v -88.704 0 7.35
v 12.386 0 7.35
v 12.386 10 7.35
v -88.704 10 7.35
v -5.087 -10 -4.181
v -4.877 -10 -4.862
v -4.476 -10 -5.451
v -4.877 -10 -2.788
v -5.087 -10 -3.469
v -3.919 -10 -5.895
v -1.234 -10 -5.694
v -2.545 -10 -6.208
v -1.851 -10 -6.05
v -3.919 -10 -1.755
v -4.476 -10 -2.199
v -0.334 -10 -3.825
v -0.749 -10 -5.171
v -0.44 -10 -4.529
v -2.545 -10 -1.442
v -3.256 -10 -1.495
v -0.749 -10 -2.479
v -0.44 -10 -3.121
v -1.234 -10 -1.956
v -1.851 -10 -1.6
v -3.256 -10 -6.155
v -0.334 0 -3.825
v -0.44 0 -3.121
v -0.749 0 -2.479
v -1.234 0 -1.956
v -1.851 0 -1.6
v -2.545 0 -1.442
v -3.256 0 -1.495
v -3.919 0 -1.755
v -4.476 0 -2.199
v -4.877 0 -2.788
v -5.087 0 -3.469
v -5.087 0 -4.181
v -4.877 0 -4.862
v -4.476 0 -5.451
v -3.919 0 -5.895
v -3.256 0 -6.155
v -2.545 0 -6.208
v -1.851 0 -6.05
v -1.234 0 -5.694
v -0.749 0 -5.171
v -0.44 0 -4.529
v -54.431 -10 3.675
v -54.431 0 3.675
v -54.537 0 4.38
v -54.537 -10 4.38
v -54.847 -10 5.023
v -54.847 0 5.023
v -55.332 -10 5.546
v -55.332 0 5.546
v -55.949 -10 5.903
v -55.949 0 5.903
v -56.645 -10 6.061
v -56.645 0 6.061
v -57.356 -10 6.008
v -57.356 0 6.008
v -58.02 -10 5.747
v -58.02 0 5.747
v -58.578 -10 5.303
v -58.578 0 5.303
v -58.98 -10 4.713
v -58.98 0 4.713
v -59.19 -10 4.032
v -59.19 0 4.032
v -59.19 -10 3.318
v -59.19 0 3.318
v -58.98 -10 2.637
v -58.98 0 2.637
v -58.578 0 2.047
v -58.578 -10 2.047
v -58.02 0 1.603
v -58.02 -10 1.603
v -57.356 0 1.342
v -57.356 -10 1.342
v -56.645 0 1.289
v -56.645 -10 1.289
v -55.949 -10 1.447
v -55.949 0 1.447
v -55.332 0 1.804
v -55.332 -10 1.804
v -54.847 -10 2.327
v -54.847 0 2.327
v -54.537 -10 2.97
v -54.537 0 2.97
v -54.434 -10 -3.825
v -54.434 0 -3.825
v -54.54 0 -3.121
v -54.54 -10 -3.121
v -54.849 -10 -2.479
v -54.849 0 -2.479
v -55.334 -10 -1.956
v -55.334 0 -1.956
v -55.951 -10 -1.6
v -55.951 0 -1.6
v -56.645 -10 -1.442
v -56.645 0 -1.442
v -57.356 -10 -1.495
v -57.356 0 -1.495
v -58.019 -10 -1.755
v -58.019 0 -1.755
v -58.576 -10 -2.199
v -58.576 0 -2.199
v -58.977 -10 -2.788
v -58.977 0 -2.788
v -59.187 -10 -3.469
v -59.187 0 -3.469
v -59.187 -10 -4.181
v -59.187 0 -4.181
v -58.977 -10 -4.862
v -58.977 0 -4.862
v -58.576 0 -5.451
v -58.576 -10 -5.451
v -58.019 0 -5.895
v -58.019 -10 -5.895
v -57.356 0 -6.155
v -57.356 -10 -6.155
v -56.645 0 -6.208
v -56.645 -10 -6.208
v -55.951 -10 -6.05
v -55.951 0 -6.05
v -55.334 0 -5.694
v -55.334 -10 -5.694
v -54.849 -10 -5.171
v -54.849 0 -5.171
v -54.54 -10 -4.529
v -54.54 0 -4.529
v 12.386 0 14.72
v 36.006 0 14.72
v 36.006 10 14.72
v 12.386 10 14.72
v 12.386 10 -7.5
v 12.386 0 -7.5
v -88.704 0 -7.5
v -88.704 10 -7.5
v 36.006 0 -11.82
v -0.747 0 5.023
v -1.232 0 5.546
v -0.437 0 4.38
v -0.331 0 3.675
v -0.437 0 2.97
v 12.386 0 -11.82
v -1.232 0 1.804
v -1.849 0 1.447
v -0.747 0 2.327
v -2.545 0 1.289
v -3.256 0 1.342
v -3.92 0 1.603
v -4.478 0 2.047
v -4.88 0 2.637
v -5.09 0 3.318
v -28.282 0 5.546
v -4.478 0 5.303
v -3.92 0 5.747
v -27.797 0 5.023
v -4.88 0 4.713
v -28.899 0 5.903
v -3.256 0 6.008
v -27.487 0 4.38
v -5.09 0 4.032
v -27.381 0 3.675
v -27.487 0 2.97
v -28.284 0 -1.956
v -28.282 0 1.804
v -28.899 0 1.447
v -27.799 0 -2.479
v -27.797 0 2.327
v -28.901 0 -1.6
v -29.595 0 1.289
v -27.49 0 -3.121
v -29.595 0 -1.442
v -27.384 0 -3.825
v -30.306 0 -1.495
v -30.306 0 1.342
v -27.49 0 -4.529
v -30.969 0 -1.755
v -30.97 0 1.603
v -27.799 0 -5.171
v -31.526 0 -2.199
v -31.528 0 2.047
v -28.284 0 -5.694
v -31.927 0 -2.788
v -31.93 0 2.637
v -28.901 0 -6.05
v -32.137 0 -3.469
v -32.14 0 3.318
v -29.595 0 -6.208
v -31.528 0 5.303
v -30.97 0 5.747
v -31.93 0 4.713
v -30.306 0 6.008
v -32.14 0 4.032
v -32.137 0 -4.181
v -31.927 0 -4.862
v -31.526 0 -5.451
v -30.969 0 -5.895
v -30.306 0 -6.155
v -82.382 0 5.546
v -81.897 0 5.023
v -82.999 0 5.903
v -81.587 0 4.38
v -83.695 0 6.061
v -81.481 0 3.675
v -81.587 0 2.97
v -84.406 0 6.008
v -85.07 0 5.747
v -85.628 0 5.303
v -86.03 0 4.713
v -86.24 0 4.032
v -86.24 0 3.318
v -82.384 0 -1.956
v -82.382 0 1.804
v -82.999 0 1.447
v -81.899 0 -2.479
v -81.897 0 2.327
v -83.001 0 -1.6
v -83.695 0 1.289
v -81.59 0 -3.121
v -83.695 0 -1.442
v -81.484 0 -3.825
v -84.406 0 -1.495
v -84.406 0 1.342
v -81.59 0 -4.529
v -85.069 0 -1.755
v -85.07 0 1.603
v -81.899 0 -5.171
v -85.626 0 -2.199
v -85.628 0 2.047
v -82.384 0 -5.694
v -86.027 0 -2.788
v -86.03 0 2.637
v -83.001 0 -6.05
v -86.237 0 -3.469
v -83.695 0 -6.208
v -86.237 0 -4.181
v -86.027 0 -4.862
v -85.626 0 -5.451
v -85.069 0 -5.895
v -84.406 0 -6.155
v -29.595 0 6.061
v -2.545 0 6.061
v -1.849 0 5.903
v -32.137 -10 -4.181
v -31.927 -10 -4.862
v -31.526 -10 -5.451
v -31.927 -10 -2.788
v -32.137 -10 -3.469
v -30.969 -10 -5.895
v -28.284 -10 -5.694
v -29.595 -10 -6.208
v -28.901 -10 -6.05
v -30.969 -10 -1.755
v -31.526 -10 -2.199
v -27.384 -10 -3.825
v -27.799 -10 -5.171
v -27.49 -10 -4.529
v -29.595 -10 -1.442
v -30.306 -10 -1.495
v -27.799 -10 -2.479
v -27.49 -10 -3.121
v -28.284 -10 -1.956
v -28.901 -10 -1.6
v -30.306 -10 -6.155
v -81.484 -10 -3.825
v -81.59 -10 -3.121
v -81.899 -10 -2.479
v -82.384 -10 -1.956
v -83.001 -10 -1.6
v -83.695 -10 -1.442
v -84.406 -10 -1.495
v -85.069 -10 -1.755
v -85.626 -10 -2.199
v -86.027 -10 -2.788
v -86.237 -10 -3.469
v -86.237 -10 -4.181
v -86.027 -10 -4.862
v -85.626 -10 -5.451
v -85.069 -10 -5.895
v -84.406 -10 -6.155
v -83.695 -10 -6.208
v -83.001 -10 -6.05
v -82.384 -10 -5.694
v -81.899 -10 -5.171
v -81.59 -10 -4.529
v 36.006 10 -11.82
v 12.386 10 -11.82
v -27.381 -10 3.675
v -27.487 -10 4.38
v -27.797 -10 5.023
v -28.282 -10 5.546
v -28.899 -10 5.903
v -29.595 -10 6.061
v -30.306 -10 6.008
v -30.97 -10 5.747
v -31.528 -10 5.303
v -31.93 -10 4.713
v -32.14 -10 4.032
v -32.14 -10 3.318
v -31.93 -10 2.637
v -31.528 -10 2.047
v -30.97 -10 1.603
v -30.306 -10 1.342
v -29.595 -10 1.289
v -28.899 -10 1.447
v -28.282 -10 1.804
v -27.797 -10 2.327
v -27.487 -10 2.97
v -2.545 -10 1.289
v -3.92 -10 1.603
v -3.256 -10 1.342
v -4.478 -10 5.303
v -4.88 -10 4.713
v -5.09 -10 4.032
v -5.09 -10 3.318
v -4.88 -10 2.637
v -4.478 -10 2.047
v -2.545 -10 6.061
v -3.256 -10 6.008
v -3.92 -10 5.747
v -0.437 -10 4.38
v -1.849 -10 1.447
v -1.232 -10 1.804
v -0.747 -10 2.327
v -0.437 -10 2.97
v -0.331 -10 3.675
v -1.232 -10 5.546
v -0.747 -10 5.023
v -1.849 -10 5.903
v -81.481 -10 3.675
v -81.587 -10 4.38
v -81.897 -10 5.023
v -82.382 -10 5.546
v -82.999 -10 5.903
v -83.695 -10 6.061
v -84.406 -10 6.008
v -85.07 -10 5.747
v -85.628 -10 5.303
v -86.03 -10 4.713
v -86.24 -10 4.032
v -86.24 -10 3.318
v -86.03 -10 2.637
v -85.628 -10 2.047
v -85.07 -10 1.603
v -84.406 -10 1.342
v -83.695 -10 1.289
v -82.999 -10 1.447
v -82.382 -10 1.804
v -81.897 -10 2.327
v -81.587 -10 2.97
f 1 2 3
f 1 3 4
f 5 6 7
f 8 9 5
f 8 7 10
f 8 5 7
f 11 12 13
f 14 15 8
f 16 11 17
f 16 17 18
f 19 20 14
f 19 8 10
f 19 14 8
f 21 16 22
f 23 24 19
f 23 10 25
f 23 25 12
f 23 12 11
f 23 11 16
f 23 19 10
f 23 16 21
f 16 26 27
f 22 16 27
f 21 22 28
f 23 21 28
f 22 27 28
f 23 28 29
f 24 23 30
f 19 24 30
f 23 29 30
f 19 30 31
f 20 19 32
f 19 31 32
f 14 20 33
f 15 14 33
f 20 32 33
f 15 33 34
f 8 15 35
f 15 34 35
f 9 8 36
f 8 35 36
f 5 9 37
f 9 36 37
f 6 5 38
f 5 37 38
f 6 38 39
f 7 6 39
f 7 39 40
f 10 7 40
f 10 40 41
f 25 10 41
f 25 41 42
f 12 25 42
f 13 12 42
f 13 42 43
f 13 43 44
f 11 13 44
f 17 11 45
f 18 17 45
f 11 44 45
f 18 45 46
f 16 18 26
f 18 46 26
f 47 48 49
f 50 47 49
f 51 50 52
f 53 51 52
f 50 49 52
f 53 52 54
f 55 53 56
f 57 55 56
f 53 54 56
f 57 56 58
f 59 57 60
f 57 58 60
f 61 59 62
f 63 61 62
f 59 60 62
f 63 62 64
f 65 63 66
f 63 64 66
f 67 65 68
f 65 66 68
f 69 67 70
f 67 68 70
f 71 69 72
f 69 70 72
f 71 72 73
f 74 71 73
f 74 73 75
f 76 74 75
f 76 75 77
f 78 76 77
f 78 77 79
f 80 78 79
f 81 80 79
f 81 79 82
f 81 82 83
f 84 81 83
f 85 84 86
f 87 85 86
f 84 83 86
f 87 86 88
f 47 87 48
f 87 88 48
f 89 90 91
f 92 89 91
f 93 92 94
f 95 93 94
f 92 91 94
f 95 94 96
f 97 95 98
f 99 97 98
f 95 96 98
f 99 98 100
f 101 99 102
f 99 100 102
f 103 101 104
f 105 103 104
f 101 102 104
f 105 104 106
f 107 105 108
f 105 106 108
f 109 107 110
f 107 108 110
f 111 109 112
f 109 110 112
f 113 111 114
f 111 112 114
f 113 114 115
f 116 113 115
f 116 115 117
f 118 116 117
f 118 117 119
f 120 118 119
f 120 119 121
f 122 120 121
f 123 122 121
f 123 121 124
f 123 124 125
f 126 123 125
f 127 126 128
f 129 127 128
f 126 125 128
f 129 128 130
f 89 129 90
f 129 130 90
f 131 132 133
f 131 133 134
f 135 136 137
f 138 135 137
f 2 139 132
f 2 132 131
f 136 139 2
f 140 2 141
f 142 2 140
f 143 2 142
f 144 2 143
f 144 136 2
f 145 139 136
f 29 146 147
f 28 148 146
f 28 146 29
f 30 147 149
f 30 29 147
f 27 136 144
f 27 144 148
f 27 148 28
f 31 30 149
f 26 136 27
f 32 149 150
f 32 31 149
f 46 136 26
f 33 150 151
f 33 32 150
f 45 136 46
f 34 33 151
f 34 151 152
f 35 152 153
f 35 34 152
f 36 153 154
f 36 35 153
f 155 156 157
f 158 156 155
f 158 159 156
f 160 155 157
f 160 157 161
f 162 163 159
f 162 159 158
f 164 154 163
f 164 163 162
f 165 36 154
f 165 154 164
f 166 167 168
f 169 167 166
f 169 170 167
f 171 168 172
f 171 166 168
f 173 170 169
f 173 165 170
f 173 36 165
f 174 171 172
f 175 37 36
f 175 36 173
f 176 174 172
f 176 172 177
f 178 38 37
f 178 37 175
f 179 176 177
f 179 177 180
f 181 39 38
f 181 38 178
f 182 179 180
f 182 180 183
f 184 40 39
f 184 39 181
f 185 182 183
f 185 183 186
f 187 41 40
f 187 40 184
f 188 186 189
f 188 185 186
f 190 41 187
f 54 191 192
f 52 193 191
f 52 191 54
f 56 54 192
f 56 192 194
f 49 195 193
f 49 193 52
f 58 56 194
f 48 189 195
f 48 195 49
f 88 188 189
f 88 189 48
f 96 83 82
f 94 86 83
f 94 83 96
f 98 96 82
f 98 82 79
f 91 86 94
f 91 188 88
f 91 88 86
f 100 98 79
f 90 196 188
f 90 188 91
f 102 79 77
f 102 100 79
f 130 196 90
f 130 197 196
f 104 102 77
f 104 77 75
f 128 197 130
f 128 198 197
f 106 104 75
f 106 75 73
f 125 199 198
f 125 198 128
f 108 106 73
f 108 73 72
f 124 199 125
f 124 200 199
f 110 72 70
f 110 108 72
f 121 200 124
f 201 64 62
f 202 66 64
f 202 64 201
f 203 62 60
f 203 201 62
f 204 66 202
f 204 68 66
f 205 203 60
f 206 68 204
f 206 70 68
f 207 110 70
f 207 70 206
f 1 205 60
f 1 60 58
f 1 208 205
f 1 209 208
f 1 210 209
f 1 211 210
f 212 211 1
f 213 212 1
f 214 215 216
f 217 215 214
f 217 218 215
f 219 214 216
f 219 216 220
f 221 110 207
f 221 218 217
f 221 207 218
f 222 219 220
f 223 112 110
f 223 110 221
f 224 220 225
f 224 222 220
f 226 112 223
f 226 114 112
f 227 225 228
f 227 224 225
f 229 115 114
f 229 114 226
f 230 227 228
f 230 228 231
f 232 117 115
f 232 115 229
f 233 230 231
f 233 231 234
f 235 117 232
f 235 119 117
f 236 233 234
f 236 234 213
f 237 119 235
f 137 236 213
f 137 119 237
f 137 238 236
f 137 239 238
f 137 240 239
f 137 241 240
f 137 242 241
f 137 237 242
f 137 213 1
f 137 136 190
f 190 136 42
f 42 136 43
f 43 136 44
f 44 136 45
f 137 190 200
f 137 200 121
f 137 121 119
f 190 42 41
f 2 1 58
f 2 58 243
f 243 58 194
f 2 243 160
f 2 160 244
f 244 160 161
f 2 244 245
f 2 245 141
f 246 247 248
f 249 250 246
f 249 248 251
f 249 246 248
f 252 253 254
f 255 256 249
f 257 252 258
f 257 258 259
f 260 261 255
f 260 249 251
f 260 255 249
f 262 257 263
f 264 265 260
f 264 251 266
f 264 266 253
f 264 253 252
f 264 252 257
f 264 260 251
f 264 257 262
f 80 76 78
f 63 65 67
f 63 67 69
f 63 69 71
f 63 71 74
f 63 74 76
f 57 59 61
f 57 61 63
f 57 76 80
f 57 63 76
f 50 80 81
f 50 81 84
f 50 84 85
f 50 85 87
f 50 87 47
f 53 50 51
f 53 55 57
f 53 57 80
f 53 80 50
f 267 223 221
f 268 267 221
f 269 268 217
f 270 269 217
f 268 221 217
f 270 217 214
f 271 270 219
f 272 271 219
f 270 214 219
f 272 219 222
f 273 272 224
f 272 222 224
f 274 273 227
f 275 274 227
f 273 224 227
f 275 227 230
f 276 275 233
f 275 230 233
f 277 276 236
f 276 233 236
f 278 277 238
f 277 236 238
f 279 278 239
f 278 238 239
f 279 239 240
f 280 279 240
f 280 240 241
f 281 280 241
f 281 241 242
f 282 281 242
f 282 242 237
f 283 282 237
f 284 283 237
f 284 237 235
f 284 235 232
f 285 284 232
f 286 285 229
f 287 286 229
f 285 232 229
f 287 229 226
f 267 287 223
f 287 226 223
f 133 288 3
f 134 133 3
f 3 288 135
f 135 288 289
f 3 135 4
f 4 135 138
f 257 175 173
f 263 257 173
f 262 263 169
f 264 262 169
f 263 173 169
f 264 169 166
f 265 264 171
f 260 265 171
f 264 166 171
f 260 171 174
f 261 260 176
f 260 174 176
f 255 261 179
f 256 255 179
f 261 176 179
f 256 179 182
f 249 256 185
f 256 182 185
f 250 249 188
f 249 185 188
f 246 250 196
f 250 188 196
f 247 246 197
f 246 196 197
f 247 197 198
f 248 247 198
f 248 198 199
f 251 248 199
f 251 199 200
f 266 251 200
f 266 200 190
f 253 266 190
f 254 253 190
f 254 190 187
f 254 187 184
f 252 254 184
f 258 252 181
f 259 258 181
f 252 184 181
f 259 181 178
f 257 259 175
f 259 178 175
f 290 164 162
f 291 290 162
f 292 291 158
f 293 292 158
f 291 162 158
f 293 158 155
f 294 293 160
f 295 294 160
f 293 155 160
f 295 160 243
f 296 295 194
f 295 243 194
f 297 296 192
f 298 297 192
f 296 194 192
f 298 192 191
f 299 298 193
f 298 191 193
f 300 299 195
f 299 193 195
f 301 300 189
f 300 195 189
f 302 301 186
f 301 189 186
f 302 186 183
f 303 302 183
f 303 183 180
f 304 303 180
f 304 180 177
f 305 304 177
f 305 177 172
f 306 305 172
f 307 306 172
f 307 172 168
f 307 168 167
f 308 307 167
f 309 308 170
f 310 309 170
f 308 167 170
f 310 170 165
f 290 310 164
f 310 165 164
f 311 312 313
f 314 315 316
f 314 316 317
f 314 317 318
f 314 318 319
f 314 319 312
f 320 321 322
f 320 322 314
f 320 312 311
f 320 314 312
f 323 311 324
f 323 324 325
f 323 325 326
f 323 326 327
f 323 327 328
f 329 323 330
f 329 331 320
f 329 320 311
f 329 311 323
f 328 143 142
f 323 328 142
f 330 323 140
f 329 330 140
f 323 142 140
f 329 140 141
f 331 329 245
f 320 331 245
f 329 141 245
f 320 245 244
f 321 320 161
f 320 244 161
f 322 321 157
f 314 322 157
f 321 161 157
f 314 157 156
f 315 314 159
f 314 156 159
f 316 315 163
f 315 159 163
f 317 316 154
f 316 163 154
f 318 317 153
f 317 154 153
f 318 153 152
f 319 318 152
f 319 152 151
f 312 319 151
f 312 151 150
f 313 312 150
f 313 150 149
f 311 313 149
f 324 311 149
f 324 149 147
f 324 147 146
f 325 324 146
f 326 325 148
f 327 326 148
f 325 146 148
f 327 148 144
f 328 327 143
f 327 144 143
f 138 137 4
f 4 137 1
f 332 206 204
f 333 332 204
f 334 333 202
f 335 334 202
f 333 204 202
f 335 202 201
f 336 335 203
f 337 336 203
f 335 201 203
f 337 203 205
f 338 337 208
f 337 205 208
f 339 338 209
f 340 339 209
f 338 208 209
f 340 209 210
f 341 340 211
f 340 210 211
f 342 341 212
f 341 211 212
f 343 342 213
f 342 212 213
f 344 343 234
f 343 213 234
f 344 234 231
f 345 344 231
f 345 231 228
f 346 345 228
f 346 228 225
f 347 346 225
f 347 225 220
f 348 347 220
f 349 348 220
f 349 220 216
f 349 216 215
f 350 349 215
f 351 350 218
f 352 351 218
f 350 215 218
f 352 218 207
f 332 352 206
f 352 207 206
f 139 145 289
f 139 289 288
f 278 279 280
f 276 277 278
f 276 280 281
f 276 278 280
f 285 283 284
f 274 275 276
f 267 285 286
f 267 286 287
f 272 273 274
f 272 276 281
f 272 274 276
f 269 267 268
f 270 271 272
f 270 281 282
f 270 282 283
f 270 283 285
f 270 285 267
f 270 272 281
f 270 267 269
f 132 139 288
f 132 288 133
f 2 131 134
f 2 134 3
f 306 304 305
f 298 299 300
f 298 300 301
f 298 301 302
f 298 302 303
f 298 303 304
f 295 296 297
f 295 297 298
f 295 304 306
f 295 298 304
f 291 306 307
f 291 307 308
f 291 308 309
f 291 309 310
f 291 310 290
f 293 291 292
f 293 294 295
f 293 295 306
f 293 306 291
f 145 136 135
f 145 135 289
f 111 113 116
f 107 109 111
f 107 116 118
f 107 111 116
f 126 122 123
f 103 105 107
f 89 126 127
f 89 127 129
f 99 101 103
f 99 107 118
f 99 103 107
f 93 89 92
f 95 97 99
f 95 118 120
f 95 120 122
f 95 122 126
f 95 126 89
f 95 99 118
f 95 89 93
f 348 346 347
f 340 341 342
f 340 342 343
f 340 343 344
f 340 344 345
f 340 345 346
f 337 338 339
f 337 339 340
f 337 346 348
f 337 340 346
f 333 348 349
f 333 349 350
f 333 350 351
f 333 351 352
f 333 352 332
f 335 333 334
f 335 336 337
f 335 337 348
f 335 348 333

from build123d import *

# Parameters (mm, degrees)
EXTRUDE_1_DEPTH        = 10
SKETCH_3_R             = 2.392945251
SKETCH_3_R_2           = 2.39
EXTRUDE_2_DEPTH        = 10
PATTERN_LINEAR_1_COUNT = 4
PATTERN_LINEAR_1_PITCH = 27.05


with BuildPart() as part:
    # 草图1 → 凸台-拉伸1 (new body)
    with BuildSketch(Plane(origin=(0, 0, 0), x_dir=(1, 0, 0), z_dir=(0, 1, 0))):
        Polygon((-88.703690987, 0), (-88.703690987, 7.5), (-83.873690987, 7.5), (-56.823690987, 7.5), (-29.773690987, 7.5), (-2.723690987, 7.5), (12.386309013, 7.5), (12.386309013, 11.82), (36.006309013, 11.82), (36.006309013, -14.72), (12.386309013, -14.72), (12.386309013, -7.35), (-88.703690987, -7.35), align=None)
    extrude(amount=EXTRUDE_1_DEPTH)

    # 草图3 → 凸台-拉伸2 (add)
    with BuildSketch(Plane.XZ):
        with Locations((-83.873690987, 3.675)):
            Circle(SKETCH_3_R)
        with Locations((-83.873690987, -3.825)):
            Circle(SKETCH_3_R_2)
    extrude_2 = extrude(amount=EXTRUDE_2_DEPTH)

    # 阵列(线性)1: 凸台-拉伸2 ×4
    with Locations(*[(i * PATTERN_LINEAR_1_PITCH, 0, 0) for i in range(1, PATTERN_LINEAR_1_COUNT)]):
        add(extrude_2)


solid = part.part
